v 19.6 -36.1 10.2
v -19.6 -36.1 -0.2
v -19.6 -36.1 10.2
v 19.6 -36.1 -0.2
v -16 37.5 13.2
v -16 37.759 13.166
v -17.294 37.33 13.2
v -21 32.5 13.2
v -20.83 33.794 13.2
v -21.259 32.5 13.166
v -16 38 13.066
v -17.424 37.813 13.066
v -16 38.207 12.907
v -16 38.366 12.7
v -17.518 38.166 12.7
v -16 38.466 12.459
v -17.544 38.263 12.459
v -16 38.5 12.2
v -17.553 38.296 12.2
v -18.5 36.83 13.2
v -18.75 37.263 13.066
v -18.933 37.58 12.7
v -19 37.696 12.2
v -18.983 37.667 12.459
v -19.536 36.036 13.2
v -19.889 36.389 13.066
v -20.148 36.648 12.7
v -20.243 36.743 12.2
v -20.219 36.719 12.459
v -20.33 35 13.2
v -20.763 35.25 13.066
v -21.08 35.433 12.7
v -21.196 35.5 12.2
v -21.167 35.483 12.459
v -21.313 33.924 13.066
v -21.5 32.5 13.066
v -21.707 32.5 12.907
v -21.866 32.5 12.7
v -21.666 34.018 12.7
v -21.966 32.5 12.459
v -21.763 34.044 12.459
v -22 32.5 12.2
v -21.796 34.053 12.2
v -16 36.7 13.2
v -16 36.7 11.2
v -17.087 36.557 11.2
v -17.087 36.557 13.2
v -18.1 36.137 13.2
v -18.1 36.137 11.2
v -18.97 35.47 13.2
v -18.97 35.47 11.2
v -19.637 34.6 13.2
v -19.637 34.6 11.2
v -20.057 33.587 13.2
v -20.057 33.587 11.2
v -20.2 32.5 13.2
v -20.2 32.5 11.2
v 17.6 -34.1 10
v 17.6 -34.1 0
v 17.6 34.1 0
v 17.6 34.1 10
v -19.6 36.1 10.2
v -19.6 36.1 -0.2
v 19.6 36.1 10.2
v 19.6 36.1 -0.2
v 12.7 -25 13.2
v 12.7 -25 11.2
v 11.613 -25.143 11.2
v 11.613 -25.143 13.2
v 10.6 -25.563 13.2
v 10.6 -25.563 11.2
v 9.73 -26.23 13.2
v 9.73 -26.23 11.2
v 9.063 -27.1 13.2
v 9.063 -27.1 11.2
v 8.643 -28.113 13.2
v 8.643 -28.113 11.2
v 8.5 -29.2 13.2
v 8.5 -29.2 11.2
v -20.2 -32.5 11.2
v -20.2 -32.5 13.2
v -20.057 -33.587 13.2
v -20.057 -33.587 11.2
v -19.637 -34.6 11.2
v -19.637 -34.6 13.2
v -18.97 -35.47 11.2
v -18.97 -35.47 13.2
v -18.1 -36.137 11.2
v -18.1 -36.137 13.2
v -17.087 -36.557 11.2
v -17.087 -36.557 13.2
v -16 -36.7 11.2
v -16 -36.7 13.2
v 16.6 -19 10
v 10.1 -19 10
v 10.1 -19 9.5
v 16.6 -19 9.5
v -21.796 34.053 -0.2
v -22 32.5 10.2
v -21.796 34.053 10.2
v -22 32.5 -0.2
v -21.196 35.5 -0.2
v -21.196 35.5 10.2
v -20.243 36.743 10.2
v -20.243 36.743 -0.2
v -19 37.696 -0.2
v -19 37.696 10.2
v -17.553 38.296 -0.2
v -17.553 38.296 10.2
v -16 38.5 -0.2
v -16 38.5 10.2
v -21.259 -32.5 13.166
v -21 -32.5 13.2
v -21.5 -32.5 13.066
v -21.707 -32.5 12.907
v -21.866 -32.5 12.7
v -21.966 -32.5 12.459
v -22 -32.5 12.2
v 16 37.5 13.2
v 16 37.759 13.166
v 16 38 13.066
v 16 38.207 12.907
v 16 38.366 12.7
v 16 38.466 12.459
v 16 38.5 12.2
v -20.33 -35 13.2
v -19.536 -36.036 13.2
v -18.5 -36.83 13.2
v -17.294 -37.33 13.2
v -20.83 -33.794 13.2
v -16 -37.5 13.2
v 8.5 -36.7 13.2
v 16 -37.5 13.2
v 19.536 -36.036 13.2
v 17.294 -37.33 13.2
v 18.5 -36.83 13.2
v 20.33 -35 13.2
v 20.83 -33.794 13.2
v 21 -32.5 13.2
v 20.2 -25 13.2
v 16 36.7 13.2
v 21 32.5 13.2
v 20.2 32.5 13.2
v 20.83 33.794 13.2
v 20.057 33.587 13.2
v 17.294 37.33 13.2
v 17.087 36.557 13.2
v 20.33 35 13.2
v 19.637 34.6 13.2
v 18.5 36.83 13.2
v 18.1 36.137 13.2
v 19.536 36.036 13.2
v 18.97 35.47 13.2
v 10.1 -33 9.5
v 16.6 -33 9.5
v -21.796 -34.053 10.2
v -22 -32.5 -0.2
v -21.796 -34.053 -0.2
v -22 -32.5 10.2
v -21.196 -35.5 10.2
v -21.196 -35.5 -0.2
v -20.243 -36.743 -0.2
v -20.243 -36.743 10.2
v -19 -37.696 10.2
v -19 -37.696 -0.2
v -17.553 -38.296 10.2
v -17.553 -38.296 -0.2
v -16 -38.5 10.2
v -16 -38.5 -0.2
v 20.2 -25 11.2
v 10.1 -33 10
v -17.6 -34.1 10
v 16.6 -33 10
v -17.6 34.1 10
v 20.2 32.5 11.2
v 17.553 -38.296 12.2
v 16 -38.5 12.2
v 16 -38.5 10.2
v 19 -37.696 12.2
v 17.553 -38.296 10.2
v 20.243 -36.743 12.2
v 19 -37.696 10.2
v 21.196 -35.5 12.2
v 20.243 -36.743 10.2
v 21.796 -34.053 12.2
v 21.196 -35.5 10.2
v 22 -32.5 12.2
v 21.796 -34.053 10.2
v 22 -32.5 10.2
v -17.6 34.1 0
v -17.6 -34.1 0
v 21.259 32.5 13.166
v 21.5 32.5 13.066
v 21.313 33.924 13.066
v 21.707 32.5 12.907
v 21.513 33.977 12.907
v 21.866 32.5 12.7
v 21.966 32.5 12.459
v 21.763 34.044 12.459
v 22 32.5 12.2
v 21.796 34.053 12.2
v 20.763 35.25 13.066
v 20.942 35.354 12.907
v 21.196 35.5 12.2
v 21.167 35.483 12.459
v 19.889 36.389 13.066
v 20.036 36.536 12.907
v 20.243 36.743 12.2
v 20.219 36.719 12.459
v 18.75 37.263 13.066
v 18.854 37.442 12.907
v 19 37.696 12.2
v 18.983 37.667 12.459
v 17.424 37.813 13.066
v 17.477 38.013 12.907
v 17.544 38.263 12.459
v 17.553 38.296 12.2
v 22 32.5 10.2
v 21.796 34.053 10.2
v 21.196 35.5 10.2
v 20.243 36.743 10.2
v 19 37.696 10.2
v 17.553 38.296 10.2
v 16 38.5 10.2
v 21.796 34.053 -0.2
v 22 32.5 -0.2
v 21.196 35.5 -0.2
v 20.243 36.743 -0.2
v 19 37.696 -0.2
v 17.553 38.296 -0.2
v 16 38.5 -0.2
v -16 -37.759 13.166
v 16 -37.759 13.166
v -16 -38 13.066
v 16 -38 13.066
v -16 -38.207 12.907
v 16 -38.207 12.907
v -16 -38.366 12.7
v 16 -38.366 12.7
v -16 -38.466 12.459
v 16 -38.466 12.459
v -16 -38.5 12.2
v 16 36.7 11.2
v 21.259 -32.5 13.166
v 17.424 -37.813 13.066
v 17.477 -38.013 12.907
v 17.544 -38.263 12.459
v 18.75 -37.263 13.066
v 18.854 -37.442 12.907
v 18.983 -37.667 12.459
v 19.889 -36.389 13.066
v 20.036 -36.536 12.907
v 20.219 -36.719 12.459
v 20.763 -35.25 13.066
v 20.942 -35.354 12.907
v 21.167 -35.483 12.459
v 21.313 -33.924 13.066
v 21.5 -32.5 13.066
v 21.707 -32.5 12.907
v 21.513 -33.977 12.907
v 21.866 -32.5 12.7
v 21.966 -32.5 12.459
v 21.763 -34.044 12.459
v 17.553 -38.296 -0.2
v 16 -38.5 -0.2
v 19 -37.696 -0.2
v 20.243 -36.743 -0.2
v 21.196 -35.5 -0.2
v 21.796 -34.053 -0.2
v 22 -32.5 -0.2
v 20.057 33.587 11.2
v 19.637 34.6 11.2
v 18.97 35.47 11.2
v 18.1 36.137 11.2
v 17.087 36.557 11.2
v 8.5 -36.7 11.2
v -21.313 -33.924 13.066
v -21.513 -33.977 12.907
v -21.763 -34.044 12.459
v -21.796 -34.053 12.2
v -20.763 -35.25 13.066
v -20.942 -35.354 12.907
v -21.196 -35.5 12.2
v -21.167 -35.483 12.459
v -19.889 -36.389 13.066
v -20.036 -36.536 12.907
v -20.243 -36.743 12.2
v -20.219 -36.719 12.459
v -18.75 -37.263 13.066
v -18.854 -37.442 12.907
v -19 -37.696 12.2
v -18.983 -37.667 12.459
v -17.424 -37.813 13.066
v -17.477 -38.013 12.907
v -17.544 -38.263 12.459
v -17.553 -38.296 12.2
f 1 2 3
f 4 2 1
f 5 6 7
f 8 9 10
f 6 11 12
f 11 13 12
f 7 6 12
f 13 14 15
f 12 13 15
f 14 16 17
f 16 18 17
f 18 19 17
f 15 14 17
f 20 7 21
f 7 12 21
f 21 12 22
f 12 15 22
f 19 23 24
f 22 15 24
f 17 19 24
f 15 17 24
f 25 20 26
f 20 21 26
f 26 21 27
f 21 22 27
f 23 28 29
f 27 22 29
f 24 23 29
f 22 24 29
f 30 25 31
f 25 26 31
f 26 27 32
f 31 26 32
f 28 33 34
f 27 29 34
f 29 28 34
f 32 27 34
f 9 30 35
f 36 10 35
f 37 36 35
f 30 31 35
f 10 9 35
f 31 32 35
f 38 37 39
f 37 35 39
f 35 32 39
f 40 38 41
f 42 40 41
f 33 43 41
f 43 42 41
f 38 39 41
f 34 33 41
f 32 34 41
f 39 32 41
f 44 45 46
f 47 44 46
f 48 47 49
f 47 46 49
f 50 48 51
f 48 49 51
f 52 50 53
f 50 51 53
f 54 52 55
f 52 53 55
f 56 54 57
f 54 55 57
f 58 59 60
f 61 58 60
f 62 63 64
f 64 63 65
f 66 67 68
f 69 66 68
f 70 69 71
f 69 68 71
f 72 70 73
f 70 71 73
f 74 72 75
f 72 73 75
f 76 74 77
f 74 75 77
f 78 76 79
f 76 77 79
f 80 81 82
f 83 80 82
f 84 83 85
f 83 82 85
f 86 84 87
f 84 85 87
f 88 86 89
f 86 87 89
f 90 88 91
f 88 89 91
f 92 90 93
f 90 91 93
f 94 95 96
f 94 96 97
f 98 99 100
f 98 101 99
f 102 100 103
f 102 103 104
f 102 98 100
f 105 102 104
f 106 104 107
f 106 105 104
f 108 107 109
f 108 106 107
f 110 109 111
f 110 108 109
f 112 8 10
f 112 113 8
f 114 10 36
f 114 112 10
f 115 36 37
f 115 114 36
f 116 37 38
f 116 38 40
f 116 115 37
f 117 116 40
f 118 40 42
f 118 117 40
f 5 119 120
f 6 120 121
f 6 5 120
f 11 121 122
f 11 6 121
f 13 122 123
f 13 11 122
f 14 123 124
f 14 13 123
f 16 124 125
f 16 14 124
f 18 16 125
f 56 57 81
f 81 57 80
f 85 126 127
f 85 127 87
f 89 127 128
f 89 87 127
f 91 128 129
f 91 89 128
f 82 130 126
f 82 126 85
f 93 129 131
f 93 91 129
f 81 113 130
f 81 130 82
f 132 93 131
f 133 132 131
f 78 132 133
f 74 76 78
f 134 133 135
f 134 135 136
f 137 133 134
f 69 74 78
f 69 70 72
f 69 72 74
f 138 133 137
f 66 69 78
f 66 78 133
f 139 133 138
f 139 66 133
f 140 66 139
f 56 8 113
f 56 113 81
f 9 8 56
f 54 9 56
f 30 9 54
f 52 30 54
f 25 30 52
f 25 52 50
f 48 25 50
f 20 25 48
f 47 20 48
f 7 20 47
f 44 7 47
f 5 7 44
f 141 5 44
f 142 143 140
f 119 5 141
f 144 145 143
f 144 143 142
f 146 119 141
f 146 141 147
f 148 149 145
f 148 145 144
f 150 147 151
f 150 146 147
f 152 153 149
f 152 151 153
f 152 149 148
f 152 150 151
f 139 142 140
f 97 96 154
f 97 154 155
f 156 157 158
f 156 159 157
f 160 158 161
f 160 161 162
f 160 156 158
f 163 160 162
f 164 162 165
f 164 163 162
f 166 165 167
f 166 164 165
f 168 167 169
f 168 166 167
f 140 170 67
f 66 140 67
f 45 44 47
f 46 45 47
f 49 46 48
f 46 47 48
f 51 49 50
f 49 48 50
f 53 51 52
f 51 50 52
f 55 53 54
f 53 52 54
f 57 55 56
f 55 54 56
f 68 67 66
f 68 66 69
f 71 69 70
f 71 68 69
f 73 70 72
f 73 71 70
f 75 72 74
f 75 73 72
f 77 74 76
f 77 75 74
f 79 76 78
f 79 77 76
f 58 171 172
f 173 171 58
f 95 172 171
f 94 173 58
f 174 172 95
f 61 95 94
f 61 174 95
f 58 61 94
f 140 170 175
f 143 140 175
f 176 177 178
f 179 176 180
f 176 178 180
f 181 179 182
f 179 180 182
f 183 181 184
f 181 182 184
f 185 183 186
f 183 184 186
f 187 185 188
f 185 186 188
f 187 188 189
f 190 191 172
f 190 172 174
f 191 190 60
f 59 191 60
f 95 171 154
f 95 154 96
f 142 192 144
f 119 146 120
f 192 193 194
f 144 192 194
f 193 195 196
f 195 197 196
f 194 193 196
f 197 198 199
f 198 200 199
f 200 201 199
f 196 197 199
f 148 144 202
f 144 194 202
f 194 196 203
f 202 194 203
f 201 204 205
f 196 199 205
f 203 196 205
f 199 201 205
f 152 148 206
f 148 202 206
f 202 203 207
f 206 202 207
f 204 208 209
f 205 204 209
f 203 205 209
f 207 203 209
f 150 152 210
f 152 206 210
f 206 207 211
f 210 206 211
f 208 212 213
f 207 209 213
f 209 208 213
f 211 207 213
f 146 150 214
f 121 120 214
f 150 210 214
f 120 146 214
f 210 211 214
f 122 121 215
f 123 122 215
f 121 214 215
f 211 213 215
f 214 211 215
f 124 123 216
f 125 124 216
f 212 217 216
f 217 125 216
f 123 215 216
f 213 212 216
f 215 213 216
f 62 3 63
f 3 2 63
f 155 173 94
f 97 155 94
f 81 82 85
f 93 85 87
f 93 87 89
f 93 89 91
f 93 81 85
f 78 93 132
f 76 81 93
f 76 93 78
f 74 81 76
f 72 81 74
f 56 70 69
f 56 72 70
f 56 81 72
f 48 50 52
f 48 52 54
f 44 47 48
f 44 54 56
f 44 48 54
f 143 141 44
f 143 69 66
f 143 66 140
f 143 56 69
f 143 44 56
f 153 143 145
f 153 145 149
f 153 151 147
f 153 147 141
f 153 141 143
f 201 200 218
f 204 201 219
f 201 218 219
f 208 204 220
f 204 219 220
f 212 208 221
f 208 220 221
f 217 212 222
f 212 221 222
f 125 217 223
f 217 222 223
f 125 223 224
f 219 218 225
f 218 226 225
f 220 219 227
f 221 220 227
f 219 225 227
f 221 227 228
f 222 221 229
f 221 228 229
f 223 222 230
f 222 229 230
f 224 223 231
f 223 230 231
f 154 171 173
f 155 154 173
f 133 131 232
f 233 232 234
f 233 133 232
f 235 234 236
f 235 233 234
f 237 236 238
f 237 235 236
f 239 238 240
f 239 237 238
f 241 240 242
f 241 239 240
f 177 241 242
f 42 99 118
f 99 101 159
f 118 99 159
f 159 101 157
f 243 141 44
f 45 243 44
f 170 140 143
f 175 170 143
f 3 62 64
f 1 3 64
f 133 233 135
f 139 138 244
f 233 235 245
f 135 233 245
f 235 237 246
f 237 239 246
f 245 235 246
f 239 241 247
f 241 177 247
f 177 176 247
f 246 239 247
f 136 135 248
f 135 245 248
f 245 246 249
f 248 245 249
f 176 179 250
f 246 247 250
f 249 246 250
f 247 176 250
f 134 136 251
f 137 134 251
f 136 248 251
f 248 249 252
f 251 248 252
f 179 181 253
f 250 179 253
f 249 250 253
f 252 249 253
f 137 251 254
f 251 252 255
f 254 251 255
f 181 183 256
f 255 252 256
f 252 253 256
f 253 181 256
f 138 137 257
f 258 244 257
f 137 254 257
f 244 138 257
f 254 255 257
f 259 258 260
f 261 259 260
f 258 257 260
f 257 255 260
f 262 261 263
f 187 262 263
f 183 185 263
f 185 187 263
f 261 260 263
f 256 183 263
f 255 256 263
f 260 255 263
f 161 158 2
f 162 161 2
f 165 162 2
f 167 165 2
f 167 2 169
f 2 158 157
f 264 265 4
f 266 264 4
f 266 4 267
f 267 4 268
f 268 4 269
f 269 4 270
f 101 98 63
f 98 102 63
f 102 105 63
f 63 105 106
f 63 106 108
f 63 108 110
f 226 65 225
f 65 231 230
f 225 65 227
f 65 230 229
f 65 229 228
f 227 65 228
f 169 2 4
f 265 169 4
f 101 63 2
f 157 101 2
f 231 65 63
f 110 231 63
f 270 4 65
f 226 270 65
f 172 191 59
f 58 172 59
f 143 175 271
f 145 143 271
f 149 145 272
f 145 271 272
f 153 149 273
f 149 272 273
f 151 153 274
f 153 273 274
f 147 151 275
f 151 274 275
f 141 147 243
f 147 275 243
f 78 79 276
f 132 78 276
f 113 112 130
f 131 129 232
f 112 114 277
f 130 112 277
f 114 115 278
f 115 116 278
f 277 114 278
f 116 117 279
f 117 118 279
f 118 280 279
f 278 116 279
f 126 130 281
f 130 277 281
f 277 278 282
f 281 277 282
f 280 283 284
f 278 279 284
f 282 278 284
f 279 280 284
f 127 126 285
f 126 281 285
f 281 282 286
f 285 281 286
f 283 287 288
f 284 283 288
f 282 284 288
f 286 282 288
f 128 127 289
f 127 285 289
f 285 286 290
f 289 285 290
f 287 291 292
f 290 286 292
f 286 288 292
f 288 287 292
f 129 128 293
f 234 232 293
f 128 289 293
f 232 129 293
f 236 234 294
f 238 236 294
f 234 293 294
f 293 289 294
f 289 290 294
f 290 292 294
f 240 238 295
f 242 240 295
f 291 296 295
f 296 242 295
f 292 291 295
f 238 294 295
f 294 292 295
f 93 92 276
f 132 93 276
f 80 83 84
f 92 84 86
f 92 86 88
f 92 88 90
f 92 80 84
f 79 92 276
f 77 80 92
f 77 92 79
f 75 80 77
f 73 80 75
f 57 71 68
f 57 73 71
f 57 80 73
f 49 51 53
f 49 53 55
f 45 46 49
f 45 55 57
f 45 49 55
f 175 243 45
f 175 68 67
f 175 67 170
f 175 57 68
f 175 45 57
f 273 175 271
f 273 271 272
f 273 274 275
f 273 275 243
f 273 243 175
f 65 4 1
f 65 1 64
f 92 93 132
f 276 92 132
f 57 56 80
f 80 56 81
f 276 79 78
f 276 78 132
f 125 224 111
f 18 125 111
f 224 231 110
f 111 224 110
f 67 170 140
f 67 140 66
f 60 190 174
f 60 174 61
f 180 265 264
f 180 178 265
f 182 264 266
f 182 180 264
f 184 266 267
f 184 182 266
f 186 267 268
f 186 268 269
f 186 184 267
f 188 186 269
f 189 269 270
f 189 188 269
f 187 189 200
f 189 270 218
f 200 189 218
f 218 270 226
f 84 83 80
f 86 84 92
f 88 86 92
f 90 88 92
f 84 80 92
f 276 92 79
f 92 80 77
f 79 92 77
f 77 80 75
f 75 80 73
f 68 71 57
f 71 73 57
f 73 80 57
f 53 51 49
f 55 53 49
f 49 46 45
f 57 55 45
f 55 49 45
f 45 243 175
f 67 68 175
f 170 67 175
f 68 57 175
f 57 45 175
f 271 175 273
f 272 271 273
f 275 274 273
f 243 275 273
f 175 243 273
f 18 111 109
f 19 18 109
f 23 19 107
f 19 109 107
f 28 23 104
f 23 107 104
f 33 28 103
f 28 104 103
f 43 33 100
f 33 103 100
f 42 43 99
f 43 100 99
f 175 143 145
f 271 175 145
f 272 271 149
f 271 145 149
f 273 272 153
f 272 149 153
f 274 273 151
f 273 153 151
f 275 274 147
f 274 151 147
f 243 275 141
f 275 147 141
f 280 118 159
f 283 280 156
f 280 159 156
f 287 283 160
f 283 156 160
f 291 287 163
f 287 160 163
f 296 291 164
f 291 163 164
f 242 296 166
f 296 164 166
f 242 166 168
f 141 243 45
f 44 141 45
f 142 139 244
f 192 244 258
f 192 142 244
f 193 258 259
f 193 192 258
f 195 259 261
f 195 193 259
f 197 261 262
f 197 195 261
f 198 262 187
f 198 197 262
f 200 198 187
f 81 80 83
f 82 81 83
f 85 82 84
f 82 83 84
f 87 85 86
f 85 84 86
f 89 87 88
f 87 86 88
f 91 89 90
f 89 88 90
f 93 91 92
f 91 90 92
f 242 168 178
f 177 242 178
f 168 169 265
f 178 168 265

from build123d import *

# Parameters (mm, degrees)
F0_W          = 35.2
F0_H          = 68.2
F1_DEPTH      = 10
F2_W          = 6.5
F2_H          = 14
F3_DEPTH      = 0.5
F4_W          = 44
F4_H          = 77
F4_W_2        = 39.2
F4_H_2        = 72.2
F5_DEPTH      = 10.2
F5_DEPTH_BACK = 0.2
F6_R          = 6
F8_DEPTH      = 3
F10_DEPTH     = 2
F12_DEPTH     = 2
F13_DEPTH     = 2
F14_R         = 1


with BuildPart() as f1:
    # F0 (on Top) → F1 (new body)
    with BuildSketch(Plane.XY):
        Rectangle(F0_W, F0_H)
    extrude(amount=F1_DEPTH)

    # F2 (on face) → F3 (cut)
    with BuildSketch(Plane.XY.offset(10)):
        with Locations((13.35, -26)):
            Rectangle(F2_W, F2_H)
    extrude(amount=-F3_DEPTH, mode=Mode.SUBTRACT)


with BuildPart() as f5:
    # F4 (on face) → F5 (new body, two sides)
    with BuildSketch(Plane.XY.offset(10)) as f5_sk:
        Rectangle(F4_W, F4_H)
        Rectangle(F4_W_2, F4_H_2, mode=Mode.SUBTRACT)
    extrude(amount=-F5_DEPTH)
    extrude(f5_sk.sketch, amount=F5_DEPTH_BACK)

    # F6
    f6_edges = [f5.edges().sort_by_distance(p)[0] for p in [
        (-22, 38.5, 5),
        (22, 38.5, 5),
        (22, -38.5, 5),
        (-22, -38.5, 5),
    ]]
    fillet(f6_edges, radius=F6_R)

    # F7 (on face) → F8 (join)
    with BuildSketch(Plane.XY.offset(10.2)):
        with BuildLine():
            ThreePointArc((-16, 38.5), (-20.2426406871, 36.7426406871), (-22, 32.5))
            Line((-22, 32.5), (-22, -32.5))
            ThreePointArc((-22, -32.5), (-20.2426406871, -36.7426406871), (-16, -38.5))
            Line((-16, -38.5), (16, -38.5))
            ThreePointArc((16, -38.5), (20.2426406871, -36.7426406871), (22, -32.5))
            Line((22, -32.5), (22, 32.5))
            ThreePointArc((22, 32.5), (20.2426406871, 36.7426406871), (16, 38.5))
            Line((16, 38.5), (-16, 38.5))
        make_face()
    extrude(amount=F8_DEPTH)

    # F9 (on face) → F10 (cut)
    with BuildSketch(Plane.XY.offset(13.2)):
        with BuildLine():
            ThreePointArc((20.2, 32.5), (18.969848481, 35.469848481), (16, 36.7))
            Line((16, 36.7), (-16, 36.7))
            ThreePointArc((-16, 36.7), (-18.969848481, 35.469848481), (-20.2, 32.5))
            Line((-20.2, 32.5), (-20.2, -32.5))
            ThreePointArc((-20.2, -32.5), (-18.969848481, -35.469848481), (-16, -36.7))
            Line((-16, -36.7), (16, -36.7))
            ThreePointArc((16, -36.7), (18.969848481, -35.469848481), (20.2, -32.5))
            Line((20.2, -32.5), (20.2, 32.5))
        make_face()
    extrude(amount=-F10_DEPTH, mode=Mode.SUBTRACT)

    # F11 (on face) → F12 (join, through all)
    with BuildSketch(Plane.XY.offset(11.2)):
        with BuildLine():
            Line((8.5, -29.2), (8.5, -36.7))
            Line((8.5, -36.7), (16, -36.7))
            ThreePointArc((16, -36.7), (18.969848481, -35.469848481), (20.2, -32.5))
            Line((20.2, -32.5), (20.2, -25))
            Line((20.2, -25), (12.7, -25))
            ThreePointArc((12.7, -25), (9.730151519, -26.230151519), (8.5, -29.2))
        make_face()
    extrude(amount=F12_DEPTH)


with BuildPart() as f13:
    # F13 (new): a face of the model
    f13_faces = [f5.part.faces().sort_by_distance(p)[0] for p in [
        (-0.65784899, 1.4142607206, 11.2),
    ]]
    extrude(f13_faces, amount=F13_DEPTH)


with BuildPart() as f5_1:
    add(f5.part)

    # F14
    f14_edges = [f5_1.edges().sort_by_distance(p)[0] for p in [
        (-22, 0, 13.2),
    ]]
    fillet(f14_edges, radius=F14_R)


solid = Compound([f1.part, f13.part, f5_1.part])
